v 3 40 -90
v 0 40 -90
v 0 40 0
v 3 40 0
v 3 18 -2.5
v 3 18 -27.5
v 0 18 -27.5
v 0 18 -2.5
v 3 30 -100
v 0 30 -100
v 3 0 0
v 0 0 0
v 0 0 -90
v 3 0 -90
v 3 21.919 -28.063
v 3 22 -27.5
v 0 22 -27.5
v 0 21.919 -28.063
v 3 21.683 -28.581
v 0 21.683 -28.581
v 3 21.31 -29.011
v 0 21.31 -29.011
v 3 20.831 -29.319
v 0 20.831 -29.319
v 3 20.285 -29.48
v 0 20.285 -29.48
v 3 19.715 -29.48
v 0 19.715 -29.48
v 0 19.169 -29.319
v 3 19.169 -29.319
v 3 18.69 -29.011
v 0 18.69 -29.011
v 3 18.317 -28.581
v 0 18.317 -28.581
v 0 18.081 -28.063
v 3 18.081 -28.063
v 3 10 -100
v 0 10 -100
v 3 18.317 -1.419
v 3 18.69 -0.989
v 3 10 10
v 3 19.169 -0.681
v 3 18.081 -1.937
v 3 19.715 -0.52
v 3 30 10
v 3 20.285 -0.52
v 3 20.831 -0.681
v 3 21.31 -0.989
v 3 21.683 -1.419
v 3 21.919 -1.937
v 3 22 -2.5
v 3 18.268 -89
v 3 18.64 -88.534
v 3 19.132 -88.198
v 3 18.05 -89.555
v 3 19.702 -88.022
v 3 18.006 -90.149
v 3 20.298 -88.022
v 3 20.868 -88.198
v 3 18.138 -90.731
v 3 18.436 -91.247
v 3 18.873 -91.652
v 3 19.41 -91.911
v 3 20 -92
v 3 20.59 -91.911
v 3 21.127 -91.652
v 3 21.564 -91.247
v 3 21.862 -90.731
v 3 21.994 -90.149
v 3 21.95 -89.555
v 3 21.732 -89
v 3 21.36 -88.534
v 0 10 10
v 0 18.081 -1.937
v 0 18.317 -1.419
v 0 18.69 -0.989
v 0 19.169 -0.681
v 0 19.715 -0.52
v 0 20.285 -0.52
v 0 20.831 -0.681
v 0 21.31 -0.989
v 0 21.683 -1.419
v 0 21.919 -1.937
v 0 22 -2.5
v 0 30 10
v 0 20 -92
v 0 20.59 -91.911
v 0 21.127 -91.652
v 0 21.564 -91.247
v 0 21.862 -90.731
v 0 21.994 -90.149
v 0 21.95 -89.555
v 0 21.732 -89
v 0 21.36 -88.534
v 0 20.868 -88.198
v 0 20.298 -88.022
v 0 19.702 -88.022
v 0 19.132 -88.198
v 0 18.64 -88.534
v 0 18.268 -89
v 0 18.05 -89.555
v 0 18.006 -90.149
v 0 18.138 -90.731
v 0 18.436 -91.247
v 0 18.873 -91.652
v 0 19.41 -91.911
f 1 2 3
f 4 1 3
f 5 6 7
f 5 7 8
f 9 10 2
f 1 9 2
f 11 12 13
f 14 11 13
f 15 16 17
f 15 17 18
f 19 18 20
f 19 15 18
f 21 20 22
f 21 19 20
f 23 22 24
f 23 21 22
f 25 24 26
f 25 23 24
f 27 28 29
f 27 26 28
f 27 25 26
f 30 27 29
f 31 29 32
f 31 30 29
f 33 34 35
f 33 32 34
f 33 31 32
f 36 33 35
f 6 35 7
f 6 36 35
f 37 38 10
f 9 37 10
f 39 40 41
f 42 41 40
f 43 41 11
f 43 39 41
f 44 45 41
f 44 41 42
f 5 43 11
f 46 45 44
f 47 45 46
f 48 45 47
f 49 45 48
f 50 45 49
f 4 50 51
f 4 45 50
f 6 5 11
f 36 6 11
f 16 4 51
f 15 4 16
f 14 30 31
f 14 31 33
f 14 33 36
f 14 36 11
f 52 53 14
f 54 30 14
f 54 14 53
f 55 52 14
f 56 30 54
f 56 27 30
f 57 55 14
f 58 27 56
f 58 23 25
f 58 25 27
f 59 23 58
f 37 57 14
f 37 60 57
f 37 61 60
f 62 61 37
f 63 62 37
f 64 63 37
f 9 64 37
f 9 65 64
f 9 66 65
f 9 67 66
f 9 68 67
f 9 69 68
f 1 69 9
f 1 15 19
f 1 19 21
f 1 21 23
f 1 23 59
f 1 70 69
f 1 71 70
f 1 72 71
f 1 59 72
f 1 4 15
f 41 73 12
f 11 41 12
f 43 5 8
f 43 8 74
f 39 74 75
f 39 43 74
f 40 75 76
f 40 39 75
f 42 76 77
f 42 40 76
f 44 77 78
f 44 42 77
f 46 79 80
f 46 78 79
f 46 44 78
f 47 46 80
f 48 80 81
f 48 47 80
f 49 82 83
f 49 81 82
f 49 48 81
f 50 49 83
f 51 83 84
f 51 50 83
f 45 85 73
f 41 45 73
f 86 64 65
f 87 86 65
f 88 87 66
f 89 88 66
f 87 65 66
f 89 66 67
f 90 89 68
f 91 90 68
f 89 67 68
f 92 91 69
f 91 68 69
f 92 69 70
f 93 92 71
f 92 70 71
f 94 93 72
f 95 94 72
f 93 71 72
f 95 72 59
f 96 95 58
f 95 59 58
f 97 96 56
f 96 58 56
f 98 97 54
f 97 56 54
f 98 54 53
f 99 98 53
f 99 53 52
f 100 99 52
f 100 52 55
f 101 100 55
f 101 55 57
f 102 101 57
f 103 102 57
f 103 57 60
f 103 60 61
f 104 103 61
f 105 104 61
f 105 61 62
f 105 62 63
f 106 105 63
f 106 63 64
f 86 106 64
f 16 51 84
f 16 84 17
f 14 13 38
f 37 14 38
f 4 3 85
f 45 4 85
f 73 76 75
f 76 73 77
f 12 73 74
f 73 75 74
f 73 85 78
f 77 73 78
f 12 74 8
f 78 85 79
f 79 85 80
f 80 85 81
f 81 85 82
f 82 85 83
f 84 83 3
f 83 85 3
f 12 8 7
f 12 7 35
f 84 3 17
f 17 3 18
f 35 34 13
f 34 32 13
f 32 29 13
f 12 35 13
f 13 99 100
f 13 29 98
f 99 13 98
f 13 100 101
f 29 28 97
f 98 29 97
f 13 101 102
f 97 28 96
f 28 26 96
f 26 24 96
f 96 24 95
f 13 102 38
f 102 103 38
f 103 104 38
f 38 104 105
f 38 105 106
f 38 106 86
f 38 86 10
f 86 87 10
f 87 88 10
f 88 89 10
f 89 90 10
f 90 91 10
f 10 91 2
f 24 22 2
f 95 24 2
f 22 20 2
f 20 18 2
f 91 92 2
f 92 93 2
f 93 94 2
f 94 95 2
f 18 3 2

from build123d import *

# Parameters (mm, degrees)
SALIENTE_EXTRUIR1_DEPTH = 3
CROQUIS3_R              = 2
CORTAR_EXTRUIR1_DEPTH   = 9


with BuildPart() as part:
    # Croquis2 → Saliente-Extruir1 (new body)
    with BuildSketch(Plane(origin=(0, 0, 0), x_dir=(0, 0, -1), z_dir=(1, 0, 0))):
        Polygon((0, 0), (90, 0), (100, 10), (100, 30), (90, 40), (0, 40), (-10, 30), (-10, 10), align=None)
    extrude(amount=SALIENTE_EXTRUIR1_DEPTH)

    # Croquis3 → Cortar-Extruir1 (cut)
    with BuildSketch(Plane(origin=(3, 0, 0), x_dir=(0, 0, -1), z_dir=(1, 0, 0))):
        with Locations((90, 20)):
            Circle(CROQUIS3_R)
        with BuildLine():
            Line((2.5, 22), (27.5, 22))
            ThreePointArc((27.5, 22), (29.5, 20), (27.5, 18))
            Line((27.5, 18), (2.5, 18))
            ThreePointArc((2.5, 18), (0.5, 20), (2.5, 22))
        make_face()
    extrude(amount=-CORTAR_EXTRUIR1_DEPTH, mode=Mode.SUBTRACT)


solid = part.part
